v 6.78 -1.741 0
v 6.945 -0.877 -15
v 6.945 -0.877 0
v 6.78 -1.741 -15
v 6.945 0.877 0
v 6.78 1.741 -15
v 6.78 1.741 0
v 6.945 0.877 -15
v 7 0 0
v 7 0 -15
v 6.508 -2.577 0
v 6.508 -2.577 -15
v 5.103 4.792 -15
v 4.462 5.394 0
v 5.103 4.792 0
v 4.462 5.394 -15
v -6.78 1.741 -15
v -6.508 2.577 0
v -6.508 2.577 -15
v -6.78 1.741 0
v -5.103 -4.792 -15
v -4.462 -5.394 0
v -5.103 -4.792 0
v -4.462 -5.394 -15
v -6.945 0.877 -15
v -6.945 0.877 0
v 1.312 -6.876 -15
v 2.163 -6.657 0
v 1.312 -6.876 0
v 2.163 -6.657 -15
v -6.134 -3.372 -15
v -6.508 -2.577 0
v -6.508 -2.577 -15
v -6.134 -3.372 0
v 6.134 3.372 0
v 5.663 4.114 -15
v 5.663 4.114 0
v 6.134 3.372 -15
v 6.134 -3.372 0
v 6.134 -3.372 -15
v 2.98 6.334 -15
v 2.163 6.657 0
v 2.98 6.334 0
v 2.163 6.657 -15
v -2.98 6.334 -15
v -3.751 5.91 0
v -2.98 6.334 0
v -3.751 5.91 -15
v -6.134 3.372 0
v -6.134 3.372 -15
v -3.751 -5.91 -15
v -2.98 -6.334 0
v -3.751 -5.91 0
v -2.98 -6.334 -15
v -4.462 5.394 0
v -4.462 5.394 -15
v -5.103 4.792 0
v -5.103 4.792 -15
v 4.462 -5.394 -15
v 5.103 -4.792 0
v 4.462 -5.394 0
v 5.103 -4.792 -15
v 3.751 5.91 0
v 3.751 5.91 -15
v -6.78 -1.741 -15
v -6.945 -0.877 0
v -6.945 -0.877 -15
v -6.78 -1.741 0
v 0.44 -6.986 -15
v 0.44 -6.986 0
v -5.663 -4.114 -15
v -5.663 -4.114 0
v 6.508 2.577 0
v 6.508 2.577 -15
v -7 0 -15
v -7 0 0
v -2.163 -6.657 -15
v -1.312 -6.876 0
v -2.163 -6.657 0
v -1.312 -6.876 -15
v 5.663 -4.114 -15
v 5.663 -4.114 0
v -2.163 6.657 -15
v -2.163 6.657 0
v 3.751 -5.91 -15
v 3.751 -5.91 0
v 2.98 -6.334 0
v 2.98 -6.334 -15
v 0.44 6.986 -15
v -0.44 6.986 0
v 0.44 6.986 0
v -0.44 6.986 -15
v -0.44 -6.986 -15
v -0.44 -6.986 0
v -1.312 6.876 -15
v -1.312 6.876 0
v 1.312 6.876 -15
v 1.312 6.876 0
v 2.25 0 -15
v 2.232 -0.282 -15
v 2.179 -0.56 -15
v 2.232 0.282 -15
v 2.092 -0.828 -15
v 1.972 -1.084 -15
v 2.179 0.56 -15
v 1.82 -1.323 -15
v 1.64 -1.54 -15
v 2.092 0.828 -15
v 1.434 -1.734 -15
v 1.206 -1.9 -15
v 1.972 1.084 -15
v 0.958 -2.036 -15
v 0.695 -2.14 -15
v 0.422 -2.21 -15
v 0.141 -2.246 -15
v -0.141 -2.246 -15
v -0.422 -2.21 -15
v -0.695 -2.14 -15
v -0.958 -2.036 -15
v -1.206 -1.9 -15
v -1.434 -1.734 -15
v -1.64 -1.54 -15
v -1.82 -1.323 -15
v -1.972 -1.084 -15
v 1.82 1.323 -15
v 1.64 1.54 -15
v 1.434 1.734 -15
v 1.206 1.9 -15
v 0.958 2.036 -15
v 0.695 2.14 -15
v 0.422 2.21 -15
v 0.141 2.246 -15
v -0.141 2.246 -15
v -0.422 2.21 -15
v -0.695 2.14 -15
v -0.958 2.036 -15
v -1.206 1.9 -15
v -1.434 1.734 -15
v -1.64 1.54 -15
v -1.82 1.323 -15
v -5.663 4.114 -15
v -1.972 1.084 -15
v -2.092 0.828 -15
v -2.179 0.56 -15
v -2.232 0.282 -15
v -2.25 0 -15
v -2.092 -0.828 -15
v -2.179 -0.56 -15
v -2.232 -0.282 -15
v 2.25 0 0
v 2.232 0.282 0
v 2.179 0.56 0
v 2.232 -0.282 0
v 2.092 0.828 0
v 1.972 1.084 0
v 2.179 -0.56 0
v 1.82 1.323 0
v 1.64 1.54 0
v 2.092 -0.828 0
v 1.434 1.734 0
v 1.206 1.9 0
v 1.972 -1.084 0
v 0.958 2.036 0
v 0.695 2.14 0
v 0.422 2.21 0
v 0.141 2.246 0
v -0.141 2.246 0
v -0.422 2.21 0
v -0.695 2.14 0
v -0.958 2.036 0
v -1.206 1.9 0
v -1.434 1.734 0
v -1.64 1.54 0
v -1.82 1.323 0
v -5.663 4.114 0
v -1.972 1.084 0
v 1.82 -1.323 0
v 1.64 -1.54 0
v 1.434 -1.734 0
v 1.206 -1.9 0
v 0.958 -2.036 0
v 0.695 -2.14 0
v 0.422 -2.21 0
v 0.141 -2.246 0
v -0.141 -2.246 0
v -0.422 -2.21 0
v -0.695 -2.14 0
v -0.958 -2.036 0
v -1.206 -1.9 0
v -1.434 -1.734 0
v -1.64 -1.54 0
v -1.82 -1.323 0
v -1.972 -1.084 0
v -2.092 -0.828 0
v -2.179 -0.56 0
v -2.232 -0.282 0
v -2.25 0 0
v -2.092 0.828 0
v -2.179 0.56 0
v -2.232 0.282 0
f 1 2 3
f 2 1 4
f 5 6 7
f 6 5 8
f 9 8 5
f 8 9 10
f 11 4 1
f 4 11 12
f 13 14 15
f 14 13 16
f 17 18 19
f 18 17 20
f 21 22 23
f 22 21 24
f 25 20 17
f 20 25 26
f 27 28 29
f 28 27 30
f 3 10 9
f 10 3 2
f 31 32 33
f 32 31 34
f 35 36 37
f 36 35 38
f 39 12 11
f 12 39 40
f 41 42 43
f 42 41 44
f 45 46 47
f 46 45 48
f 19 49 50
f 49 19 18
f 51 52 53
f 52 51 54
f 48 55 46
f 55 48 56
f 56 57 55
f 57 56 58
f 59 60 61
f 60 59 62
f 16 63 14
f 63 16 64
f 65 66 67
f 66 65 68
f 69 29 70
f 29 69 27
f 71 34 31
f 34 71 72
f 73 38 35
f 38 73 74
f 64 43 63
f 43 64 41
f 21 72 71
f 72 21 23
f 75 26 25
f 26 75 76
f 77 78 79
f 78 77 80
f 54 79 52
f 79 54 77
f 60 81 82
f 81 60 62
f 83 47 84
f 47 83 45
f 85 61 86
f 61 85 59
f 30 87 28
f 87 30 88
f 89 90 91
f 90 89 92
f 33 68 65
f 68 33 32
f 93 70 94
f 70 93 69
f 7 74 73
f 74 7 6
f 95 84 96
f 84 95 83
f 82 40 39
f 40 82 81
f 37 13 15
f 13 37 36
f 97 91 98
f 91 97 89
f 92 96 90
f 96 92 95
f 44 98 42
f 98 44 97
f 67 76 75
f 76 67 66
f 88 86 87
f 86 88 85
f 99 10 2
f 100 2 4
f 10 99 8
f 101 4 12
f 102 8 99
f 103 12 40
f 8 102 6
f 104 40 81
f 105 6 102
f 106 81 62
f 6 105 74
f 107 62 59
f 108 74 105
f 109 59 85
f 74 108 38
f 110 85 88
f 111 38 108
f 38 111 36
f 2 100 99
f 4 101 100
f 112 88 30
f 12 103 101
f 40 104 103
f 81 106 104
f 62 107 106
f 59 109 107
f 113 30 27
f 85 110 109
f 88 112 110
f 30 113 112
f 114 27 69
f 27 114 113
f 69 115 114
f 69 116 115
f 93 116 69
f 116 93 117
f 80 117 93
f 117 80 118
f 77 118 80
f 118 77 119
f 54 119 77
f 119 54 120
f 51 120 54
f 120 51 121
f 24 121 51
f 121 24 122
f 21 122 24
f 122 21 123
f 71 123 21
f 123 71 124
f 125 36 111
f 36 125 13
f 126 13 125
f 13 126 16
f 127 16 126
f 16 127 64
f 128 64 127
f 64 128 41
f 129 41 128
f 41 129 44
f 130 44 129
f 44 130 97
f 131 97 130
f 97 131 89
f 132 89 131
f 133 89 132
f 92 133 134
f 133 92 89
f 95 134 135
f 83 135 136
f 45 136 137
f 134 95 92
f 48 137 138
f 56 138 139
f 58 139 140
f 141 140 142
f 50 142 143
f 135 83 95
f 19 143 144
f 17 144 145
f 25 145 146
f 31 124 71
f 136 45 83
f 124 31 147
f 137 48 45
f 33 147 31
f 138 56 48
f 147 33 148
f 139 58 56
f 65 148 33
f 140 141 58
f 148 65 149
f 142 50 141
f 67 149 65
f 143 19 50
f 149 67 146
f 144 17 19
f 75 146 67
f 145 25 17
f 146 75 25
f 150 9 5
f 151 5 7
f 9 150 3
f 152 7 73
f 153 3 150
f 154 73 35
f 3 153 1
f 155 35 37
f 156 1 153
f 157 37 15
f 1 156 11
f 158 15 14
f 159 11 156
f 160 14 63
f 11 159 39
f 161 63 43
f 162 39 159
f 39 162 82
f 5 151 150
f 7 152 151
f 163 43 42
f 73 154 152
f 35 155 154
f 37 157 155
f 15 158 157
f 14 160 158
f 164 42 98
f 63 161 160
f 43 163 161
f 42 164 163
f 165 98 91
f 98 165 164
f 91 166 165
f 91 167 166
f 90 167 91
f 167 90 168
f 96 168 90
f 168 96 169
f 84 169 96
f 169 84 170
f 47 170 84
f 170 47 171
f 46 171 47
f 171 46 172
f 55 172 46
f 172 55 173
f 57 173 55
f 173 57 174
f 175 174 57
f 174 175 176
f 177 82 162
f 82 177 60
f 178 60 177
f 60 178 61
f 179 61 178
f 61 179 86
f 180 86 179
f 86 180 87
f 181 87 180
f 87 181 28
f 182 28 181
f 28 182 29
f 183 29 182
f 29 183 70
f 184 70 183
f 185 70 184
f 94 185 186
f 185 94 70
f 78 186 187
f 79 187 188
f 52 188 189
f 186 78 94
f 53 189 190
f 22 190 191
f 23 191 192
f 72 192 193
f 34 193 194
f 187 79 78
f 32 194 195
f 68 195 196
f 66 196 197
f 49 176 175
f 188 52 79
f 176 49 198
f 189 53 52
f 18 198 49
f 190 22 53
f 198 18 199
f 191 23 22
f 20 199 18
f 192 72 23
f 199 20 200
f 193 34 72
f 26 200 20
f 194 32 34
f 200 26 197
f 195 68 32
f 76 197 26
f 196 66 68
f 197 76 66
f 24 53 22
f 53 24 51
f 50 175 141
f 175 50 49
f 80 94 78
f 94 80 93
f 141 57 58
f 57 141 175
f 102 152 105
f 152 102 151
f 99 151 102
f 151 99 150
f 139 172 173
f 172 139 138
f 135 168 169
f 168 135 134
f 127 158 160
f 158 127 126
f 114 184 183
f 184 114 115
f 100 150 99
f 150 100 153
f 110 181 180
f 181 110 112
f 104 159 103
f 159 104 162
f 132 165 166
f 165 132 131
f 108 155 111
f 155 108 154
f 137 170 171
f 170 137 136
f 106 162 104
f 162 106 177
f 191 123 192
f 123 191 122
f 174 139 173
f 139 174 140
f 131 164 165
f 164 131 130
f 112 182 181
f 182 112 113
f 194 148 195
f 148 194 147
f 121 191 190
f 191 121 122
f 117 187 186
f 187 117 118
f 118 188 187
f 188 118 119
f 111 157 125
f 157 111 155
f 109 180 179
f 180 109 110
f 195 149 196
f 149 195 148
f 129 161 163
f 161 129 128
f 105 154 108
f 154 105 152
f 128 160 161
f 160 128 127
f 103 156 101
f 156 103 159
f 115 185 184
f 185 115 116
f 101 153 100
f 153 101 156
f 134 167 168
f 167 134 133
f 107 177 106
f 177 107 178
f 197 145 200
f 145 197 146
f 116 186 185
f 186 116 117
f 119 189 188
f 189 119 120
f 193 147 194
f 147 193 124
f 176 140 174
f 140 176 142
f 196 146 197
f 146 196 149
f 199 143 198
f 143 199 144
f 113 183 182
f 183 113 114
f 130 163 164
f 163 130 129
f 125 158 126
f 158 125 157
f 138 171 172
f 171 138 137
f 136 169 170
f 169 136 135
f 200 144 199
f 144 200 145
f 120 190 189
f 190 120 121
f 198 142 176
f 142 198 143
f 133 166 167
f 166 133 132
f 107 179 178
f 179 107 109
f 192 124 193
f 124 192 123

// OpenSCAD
$fn = 50;


difference() {
	union() {
		translate(v = [0, 0, -15.0000000000]) {
			cylinder(h = 15, r = 7.0000000000);
		}
	}
	union() {
		#translate(v = [0, 0, -15]) {
			cylinder(h = 15, r = 2.2500000000);
		}
	}
}
